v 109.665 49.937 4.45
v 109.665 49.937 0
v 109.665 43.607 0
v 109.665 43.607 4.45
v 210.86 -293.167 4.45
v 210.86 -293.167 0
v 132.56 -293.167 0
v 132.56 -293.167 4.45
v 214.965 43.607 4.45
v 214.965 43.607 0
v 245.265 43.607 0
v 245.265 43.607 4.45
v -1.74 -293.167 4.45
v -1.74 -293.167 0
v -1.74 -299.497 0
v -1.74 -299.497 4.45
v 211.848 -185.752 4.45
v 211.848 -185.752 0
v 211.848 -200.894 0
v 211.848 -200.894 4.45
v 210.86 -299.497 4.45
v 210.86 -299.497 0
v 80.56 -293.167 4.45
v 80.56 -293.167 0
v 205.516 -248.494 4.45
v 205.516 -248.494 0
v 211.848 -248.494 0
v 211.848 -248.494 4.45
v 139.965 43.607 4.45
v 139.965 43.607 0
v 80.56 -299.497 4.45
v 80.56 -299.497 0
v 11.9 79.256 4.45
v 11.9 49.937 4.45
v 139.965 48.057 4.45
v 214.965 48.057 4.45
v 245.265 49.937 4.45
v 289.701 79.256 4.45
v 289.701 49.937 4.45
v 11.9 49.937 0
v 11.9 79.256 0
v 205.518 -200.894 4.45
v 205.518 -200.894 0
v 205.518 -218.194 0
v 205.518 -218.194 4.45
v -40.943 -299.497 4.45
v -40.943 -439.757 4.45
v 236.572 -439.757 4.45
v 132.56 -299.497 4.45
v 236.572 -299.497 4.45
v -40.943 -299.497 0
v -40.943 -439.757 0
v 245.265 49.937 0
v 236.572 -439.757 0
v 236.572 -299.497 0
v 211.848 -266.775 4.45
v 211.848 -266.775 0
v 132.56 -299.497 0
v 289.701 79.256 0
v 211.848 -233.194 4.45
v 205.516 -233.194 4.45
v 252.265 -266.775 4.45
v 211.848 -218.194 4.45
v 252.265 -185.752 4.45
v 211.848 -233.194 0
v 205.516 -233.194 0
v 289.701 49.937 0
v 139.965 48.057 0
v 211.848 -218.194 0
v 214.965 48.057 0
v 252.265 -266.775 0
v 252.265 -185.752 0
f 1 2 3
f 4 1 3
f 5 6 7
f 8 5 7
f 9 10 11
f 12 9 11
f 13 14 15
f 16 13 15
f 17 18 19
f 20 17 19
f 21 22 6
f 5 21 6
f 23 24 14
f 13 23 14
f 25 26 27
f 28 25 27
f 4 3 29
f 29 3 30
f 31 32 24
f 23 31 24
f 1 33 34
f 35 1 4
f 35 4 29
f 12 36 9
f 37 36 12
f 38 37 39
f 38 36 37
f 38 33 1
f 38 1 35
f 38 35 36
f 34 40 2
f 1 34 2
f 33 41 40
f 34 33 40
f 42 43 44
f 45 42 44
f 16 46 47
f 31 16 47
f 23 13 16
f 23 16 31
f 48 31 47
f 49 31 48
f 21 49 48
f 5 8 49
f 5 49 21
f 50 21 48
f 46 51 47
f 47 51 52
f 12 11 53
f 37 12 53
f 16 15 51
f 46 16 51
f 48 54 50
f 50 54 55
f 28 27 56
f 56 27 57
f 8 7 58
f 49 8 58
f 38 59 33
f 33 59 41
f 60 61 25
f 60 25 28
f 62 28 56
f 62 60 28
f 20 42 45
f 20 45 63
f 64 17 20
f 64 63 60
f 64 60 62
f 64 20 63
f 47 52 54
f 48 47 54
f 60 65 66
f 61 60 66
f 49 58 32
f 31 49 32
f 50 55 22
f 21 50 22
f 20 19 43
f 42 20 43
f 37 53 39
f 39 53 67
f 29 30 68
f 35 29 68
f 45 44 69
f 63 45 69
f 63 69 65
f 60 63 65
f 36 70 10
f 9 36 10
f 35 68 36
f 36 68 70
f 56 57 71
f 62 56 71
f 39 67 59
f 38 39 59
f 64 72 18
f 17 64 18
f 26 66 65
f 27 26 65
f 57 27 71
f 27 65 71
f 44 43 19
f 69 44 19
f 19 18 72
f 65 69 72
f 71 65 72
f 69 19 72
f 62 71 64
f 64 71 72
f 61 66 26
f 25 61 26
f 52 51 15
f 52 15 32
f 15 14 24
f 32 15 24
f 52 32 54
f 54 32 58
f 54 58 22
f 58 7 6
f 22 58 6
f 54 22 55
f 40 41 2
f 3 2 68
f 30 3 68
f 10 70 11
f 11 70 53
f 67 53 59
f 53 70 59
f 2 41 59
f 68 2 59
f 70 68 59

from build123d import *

# Parameters (mm, degrees)
F1_DEPTH = 4.45


# Not quite as in the source:
# - a feature names something its author has since deleted; it is built from what else it names


with BuildPart() as f1:
    # F0 (on Top) → F1 (new body)
    with BuildSketch(Plane.XY):
        Polygon((-1.7402413478, -299.4968297958), (-40.9429369935, -299.4968297958), (-40.9429369935, -439.7566318512), (236.5724275148, -439.7566318512), (236.5724275148, -299.4968297958), (215.0616164281, -299.4968297958), (210.8597586522, -299.4968297958), (210.8597586522, -293.1668297958), (132.5597586522, -293.1668297958), (132.5597586522, -299.4968297958), (80.5597586522, -299.4968297958), (80.5597586522, -293.1668297958), (-1.7402413478, -293.1668297958), align=None)
    extrude(amount=F1_DEPTH)


with BuildPart() as f1b:
    # F0 (on Top) → F1, piece 2 (new body)
    with BuildSketch(Plane.XY):
        Polygon((252.2649765015, -185.7516178083), (211.8477205402, -185.7516178083), (211.8477205402, -200.6451304226), (211.8477205402, -200.8938822837), (205.5177205402, -200.8938822837), (205.5177205402, -218.1938822837), (211.8477205402, -218.1938822837), (211.8477205402, -226.2631509995), (211.8477205402, -230.1938822837), (211.8477205402, -232.7680322837), (211.8477205402, -233.1938822837), (205.5161595345, -233.1938822837), (205.5161595345, -248.4938822837), (211.8477205402, -248.4938822837), (211.8477205402, -266.7746841908), (252.2649765015, -266.7746841908), align=None)
    extrude(amount=F1_DEPTH)


with BuildPart() as f1c:
    # F0 (on Top) → F1, piece 3 (new body)
    with BuildSketch(Plane.XY):
        Polygon((109.6645991251, 49.936733744), (109.6645991251, 43.606733744), (139.9645991251, 43.606733744), (139.9645991251, 48.056733744), (214.9645991251, 48.056733744), (214.9645991251, 43.606733744), (245.2645991251, 43.606733744), (245.2645991251, 49.936733744), (289.7008654758, 49.936733744), (289.7008654758, 79.2557150126), (11.8996296078, 79.2557150126), (11.8996296078, 49.936733744), (86.1305896078, 49.936733744), align=None)
    extrude(amount=F1_DEPTH)


solid = Compound([f1.part, f1b.part, f1c.part])
